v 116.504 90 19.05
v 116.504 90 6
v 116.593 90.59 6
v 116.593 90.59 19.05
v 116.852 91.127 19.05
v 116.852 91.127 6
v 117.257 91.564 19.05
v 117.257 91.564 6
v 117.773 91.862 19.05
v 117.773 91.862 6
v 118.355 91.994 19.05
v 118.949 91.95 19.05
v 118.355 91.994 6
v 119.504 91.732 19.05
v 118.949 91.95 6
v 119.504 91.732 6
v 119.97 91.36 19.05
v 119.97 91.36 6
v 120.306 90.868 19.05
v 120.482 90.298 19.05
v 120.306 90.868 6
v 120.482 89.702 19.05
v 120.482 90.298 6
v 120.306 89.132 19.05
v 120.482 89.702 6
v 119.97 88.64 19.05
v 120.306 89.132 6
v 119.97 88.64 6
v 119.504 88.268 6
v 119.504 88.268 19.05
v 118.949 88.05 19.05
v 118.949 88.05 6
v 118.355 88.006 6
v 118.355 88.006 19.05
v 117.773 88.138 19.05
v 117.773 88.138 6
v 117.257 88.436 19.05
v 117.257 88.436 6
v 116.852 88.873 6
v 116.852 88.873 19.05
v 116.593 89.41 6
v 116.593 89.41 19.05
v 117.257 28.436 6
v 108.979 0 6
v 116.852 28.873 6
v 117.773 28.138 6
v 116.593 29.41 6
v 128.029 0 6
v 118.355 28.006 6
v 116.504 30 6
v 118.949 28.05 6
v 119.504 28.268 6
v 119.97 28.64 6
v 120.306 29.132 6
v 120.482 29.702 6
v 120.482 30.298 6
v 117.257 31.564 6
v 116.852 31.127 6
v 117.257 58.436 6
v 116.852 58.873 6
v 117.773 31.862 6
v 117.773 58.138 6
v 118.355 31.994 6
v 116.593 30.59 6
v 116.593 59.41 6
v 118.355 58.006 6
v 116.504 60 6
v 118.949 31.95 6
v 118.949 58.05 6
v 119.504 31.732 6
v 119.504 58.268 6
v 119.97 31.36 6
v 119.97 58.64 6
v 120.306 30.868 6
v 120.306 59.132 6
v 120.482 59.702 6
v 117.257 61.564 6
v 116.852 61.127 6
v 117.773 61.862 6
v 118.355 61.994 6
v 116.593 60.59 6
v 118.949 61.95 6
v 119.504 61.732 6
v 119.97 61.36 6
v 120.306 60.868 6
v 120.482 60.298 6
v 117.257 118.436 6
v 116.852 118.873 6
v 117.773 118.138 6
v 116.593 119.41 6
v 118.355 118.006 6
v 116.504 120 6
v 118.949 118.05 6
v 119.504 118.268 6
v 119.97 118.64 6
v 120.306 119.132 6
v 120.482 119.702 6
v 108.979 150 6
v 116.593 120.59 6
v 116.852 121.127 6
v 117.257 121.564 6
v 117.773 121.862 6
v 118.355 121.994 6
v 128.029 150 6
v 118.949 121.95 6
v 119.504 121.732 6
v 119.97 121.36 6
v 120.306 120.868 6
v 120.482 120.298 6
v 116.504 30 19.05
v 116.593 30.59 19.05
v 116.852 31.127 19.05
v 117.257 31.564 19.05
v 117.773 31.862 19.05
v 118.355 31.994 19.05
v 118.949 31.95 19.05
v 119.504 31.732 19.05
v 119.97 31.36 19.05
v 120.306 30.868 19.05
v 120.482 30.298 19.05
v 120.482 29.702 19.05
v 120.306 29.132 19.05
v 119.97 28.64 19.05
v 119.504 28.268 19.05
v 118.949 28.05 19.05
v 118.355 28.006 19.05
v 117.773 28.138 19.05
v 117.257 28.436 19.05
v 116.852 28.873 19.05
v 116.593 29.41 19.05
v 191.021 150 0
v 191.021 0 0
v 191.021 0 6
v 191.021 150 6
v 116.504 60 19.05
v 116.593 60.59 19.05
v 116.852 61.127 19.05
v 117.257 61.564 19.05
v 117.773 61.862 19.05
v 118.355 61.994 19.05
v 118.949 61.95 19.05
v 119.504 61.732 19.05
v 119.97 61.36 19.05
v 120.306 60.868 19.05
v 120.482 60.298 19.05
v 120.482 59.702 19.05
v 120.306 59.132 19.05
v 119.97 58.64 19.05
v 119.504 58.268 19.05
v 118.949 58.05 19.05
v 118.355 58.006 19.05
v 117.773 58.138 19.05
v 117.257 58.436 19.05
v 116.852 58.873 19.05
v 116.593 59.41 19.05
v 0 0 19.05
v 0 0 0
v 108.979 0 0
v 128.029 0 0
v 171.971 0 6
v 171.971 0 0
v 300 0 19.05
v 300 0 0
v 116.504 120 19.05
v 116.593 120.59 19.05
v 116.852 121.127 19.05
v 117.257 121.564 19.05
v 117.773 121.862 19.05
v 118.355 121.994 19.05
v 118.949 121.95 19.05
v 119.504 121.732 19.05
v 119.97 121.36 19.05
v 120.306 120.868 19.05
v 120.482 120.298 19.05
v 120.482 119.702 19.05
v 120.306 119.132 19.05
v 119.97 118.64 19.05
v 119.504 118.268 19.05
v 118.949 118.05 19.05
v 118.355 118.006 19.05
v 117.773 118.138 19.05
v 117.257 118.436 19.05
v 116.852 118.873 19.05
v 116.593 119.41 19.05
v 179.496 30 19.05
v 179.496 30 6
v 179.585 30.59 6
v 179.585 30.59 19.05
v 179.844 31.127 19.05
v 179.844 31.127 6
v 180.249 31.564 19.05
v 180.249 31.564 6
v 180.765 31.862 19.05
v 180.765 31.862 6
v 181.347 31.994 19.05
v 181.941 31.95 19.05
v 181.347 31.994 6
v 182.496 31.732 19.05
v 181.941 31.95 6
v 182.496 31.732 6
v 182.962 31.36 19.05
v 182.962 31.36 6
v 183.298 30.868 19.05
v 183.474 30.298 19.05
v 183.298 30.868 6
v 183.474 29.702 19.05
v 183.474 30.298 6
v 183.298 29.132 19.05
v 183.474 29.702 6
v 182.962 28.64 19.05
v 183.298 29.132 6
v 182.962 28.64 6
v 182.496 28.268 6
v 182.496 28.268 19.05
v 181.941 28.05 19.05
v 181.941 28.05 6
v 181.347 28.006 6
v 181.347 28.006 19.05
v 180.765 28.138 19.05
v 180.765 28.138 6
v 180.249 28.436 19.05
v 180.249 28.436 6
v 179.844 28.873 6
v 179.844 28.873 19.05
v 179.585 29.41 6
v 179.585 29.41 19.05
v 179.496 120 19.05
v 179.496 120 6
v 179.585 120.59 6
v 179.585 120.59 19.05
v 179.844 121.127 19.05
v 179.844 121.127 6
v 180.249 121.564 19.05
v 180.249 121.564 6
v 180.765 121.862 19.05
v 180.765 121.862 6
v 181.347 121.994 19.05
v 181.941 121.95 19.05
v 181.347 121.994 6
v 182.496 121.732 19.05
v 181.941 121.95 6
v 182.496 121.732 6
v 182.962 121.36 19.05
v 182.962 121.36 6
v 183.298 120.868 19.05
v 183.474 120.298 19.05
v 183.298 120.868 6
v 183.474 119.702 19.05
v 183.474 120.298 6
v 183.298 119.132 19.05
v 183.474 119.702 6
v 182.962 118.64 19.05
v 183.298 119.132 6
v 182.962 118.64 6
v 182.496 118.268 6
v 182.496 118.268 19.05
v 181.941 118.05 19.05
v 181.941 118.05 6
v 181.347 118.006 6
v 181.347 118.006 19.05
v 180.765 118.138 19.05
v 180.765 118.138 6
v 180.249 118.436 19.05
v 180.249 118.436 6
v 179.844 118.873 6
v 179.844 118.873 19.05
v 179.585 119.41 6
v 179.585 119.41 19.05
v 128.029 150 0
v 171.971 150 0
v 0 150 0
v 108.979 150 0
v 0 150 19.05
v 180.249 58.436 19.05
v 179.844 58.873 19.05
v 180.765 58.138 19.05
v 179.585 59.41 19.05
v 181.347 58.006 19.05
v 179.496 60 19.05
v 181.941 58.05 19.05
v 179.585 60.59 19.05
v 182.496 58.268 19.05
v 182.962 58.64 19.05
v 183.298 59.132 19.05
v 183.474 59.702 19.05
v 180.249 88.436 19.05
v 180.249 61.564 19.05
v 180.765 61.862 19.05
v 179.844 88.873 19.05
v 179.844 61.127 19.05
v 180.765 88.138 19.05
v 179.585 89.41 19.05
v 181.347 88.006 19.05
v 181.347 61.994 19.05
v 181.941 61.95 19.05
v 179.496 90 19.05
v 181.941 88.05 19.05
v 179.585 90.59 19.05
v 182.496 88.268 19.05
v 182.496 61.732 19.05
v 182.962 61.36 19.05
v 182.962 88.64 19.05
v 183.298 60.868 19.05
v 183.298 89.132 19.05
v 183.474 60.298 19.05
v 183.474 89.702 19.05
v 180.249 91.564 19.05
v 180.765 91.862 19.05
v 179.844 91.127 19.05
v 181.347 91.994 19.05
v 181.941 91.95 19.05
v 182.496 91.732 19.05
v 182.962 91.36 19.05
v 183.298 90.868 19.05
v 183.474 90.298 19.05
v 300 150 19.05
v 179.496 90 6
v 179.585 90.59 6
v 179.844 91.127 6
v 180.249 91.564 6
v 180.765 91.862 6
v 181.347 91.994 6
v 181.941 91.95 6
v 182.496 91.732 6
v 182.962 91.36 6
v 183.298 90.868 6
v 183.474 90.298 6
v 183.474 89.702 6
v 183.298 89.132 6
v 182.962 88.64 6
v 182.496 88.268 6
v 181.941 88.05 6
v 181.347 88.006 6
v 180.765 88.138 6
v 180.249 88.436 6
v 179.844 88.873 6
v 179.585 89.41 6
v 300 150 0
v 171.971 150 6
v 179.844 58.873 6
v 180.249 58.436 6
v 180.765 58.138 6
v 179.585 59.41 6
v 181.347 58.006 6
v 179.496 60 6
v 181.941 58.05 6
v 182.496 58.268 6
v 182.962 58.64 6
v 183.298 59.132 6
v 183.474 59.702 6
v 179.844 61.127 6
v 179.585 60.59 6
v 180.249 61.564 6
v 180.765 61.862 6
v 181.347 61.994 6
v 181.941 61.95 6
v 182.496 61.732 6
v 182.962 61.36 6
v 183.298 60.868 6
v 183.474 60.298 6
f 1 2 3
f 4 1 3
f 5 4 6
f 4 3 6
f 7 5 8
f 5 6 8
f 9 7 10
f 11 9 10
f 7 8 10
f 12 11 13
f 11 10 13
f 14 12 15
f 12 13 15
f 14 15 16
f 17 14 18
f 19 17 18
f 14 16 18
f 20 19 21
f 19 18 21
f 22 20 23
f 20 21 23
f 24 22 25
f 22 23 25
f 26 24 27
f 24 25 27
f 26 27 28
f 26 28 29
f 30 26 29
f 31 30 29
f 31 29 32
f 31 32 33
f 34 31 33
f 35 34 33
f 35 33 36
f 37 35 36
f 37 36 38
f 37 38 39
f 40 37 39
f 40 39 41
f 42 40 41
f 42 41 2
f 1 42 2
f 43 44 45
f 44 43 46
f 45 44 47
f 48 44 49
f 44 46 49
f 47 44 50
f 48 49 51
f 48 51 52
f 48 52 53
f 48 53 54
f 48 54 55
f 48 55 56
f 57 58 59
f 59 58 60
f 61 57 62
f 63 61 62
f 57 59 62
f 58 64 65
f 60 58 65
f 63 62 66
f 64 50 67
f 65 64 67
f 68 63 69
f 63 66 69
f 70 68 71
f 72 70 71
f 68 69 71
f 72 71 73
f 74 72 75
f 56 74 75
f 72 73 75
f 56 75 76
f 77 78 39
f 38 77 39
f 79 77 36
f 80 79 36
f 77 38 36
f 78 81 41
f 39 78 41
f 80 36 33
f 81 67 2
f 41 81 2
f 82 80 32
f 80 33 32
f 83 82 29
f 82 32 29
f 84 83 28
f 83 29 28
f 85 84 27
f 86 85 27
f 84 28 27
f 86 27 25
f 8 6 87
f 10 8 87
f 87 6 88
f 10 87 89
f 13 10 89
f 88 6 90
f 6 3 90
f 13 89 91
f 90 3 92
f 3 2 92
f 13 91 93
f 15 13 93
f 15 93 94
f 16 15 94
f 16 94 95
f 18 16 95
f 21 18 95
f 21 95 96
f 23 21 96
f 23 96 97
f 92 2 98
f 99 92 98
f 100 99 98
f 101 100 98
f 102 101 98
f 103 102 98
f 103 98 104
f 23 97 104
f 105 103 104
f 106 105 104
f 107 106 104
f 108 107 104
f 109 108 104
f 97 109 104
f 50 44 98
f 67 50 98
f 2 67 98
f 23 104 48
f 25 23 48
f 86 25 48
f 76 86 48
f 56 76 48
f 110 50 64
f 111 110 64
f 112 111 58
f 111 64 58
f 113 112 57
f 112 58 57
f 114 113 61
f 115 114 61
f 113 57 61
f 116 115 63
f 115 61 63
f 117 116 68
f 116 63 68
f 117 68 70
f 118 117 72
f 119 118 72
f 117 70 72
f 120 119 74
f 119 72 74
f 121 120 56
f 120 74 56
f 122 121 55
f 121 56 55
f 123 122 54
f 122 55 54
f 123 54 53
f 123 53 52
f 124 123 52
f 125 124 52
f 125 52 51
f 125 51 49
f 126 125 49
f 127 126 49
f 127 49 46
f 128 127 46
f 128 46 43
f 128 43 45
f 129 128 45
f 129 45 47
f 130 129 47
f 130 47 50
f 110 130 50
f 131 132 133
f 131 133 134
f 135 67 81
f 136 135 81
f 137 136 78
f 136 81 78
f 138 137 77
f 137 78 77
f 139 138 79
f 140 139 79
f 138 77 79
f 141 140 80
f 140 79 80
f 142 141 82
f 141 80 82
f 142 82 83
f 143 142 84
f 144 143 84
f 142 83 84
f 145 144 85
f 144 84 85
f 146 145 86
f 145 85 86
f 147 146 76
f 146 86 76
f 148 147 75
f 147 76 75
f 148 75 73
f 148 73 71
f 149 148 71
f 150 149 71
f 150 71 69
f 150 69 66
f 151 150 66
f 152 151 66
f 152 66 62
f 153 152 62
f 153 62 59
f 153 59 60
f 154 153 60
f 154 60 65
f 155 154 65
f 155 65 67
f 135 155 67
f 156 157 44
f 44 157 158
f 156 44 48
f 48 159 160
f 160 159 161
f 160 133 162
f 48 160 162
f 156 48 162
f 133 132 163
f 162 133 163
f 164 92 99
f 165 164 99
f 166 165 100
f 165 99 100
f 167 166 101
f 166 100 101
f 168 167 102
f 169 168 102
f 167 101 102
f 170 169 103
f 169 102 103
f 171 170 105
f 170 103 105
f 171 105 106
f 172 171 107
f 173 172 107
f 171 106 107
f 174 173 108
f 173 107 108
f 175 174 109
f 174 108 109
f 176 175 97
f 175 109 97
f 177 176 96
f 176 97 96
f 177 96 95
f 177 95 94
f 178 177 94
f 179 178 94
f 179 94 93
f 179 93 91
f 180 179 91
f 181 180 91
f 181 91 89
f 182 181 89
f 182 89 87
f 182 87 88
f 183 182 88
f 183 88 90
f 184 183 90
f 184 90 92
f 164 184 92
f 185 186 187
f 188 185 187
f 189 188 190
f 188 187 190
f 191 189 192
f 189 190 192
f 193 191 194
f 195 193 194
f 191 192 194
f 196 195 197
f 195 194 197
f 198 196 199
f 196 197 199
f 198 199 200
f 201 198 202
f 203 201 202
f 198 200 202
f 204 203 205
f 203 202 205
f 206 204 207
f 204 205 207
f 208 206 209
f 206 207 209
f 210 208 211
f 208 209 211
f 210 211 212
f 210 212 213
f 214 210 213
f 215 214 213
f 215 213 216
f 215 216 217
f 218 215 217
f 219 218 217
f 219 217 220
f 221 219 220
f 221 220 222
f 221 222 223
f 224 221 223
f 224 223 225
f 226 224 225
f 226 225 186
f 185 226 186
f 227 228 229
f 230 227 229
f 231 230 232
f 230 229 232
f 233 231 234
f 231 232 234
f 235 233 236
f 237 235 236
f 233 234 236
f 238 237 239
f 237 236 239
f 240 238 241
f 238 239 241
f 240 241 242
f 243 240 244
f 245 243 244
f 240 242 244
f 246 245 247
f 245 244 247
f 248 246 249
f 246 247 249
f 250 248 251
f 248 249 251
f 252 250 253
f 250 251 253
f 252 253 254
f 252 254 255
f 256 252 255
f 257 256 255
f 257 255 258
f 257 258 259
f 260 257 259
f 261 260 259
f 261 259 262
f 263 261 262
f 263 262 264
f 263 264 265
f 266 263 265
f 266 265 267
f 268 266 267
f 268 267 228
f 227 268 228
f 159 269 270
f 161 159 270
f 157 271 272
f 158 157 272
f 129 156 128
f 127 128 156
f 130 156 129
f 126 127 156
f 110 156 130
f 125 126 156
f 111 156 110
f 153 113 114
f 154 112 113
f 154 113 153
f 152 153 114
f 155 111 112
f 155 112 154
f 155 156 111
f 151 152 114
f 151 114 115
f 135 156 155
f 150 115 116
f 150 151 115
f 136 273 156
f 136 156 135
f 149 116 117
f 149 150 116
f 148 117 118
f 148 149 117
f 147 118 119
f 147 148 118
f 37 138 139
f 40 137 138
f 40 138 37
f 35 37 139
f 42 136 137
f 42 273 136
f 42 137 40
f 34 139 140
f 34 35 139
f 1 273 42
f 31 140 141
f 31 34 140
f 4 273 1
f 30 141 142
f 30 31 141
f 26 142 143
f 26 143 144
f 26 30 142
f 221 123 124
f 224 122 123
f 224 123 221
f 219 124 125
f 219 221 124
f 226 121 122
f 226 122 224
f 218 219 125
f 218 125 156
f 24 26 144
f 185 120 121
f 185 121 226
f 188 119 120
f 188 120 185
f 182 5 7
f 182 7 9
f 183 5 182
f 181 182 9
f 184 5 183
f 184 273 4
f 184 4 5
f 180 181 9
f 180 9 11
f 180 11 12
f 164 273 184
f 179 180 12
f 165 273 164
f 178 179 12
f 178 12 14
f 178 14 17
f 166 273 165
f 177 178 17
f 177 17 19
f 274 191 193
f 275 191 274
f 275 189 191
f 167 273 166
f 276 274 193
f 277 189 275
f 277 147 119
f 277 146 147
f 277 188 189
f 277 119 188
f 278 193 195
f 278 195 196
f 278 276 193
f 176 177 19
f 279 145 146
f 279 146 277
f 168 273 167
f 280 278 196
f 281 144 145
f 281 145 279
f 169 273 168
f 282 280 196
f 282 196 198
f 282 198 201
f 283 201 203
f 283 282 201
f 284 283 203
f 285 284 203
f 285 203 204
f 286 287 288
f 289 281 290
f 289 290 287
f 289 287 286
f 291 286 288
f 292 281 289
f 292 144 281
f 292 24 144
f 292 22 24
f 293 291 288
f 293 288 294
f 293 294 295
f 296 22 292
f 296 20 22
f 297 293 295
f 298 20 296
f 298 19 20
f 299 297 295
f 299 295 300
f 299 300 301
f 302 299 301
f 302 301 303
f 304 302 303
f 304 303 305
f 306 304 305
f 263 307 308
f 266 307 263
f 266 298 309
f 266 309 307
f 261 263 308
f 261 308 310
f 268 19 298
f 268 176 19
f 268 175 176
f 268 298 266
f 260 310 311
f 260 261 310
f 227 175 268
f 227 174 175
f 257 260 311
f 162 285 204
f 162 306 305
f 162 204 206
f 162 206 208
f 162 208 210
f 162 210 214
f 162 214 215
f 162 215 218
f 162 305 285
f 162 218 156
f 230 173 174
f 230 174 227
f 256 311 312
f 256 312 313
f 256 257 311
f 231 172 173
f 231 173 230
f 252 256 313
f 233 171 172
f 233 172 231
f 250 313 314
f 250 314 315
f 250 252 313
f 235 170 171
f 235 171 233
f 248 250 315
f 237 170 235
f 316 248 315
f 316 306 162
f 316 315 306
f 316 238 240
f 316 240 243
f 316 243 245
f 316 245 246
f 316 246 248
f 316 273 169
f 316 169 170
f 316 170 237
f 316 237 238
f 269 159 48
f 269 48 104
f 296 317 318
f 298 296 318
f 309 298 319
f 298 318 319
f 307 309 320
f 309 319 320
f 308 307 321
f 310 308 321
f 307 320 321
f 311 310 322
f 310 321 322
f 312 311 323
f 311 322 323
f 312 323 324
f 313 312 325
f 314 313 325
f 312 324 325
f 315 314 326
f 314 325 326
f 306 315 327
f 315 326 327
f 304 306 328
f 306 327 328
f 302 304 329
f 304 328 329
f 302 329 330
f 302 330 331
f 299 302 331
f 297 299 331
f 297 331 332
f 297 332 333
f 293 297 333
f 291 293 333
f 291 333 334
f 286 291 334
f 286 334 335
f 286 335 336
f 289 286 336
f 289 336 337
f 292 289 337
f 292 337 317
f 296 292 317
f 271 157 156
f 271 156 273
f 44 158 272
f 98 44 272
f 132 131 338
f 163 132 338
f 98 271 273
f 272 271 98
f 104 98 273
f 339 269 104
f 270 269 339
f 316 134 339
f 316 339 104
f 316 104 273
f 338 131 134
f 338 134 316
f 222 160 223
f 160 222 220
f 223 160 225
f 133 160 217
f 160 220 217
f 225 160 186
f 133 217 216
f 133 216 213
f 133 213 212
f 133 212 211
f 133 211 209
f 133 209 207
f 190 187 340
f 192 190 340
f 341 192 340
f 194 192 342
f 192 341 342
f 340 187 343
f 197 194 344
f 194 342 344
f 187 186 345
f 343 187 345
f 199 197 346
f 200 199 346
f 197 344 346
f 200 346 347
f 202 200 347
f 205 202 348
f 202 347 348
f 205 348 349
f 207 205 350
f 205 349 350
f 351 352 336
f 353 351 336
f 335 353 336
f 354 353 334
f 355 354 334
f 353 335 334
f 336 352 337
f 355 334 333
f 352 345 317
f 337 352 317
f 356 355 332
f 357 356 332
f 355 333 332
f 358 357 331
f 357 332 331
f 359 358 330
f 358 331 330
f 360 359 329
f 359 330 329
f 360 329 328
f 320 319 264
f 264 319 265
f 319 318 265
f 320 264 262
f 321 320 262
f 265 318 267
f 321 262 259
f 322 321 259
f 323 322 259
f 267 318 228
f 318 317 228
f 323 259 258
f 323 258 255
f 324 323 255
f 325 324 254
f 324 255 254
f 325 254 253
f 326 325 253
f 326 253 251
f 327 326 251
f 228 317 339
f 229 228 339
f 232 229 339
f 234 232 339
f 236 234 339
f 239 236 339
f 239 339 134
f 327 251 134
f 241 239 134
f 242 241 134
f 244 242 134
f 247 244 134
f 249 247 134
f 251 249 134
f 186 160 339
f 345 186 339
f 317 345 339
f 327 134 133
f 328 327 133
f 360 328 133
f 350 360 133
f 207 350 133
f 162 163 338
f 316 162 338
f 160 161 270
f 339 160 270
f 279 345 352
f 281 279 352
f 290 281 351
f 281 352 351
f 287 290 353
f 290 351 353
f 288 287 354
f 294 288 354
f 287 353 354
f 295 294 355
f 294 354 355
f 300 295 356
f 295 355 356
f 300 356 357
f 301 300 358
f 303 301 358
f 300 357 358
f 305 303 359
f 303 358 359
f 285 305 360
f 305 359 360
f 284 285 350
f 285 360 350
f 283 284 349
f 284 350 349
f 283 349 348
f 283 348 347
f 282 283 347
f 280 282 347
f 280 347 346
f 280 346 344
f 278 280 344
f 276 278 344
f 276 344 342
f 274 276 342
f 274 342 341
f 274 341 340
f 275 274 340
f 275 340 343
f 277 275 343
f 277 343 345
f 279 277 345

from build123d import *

# Parameters (mm, degrees)
SKETCH1_W           = 300
SKETCH1_H           = 150
BOSS_EXTRUDE1_DEPTH = 19.05
SKETCH1_3_W         = 19.05
SKETCH1_3_H         = 150
CUT_EXTRUDE1_DEPTH  = 6
SKETCH4_R           = 2
CUT_EXTRUDE3_DEPTH  = 14.05


with BuildPart() as part:
    # Sketch1 → Boss-Extrude1 (new body)
    with BuildSketch(Plane.XY):
        with Locations((150, 75)):
            Rectangle(SKETCH1_W, SKETCH1_H)
    extrude(amount=BOSS_EXTRUDE1_DEPTH)

    # Sketch1_3 → Cut-Extrude1 (cut)
    with BuildSketch(Plane.XY):
        with Locations((181.496, 75)):
            Rectangle(SKETCH1_3_W, SKETCH1_3_H)
        with Locations((118.504, 75)):
            Rectangle(SKETCH1_3_W, SKETCH1_3_H)
    extrude(amount=CUT_EXTRUDE1_DEPTH, mode=Mode.SUBTRACT)

    # Sketch4 → Cut-Extrude3 (cut, through all)
    with BuildSketch(Plane(origin=(0, 0, 6), x_dir=(-1, 0, 0), z_dir=(0, 0, -1))):
        with Locations((-118.504, 30)):
            Circle(SKETCH4_R)
        with Locations((-181.496, 30)):
            Circle(SKETCH4_R)
        with Locations((-181.496, 60)):
            Circle(SKETCH4_R)
        with Locations((-181.496, 90)):
            Circle(SKETCH4_R)
        with Locations((-181.496, 120)):
            Circle(SKETCH4_R)
        with Locations((-118.504, 60)):
            Circle(SKETCH4_R)
        with Locations((-118.504, 90)):
            Circle(SKETCH4_R)
        with Locations((-118.504, 120)):
            Circle(SKETCH4_R)
    extrude(amount=-CUT_EXTRUDE3_DEPTH, mode=Mode.SUBTRACT)


solid = part.part
